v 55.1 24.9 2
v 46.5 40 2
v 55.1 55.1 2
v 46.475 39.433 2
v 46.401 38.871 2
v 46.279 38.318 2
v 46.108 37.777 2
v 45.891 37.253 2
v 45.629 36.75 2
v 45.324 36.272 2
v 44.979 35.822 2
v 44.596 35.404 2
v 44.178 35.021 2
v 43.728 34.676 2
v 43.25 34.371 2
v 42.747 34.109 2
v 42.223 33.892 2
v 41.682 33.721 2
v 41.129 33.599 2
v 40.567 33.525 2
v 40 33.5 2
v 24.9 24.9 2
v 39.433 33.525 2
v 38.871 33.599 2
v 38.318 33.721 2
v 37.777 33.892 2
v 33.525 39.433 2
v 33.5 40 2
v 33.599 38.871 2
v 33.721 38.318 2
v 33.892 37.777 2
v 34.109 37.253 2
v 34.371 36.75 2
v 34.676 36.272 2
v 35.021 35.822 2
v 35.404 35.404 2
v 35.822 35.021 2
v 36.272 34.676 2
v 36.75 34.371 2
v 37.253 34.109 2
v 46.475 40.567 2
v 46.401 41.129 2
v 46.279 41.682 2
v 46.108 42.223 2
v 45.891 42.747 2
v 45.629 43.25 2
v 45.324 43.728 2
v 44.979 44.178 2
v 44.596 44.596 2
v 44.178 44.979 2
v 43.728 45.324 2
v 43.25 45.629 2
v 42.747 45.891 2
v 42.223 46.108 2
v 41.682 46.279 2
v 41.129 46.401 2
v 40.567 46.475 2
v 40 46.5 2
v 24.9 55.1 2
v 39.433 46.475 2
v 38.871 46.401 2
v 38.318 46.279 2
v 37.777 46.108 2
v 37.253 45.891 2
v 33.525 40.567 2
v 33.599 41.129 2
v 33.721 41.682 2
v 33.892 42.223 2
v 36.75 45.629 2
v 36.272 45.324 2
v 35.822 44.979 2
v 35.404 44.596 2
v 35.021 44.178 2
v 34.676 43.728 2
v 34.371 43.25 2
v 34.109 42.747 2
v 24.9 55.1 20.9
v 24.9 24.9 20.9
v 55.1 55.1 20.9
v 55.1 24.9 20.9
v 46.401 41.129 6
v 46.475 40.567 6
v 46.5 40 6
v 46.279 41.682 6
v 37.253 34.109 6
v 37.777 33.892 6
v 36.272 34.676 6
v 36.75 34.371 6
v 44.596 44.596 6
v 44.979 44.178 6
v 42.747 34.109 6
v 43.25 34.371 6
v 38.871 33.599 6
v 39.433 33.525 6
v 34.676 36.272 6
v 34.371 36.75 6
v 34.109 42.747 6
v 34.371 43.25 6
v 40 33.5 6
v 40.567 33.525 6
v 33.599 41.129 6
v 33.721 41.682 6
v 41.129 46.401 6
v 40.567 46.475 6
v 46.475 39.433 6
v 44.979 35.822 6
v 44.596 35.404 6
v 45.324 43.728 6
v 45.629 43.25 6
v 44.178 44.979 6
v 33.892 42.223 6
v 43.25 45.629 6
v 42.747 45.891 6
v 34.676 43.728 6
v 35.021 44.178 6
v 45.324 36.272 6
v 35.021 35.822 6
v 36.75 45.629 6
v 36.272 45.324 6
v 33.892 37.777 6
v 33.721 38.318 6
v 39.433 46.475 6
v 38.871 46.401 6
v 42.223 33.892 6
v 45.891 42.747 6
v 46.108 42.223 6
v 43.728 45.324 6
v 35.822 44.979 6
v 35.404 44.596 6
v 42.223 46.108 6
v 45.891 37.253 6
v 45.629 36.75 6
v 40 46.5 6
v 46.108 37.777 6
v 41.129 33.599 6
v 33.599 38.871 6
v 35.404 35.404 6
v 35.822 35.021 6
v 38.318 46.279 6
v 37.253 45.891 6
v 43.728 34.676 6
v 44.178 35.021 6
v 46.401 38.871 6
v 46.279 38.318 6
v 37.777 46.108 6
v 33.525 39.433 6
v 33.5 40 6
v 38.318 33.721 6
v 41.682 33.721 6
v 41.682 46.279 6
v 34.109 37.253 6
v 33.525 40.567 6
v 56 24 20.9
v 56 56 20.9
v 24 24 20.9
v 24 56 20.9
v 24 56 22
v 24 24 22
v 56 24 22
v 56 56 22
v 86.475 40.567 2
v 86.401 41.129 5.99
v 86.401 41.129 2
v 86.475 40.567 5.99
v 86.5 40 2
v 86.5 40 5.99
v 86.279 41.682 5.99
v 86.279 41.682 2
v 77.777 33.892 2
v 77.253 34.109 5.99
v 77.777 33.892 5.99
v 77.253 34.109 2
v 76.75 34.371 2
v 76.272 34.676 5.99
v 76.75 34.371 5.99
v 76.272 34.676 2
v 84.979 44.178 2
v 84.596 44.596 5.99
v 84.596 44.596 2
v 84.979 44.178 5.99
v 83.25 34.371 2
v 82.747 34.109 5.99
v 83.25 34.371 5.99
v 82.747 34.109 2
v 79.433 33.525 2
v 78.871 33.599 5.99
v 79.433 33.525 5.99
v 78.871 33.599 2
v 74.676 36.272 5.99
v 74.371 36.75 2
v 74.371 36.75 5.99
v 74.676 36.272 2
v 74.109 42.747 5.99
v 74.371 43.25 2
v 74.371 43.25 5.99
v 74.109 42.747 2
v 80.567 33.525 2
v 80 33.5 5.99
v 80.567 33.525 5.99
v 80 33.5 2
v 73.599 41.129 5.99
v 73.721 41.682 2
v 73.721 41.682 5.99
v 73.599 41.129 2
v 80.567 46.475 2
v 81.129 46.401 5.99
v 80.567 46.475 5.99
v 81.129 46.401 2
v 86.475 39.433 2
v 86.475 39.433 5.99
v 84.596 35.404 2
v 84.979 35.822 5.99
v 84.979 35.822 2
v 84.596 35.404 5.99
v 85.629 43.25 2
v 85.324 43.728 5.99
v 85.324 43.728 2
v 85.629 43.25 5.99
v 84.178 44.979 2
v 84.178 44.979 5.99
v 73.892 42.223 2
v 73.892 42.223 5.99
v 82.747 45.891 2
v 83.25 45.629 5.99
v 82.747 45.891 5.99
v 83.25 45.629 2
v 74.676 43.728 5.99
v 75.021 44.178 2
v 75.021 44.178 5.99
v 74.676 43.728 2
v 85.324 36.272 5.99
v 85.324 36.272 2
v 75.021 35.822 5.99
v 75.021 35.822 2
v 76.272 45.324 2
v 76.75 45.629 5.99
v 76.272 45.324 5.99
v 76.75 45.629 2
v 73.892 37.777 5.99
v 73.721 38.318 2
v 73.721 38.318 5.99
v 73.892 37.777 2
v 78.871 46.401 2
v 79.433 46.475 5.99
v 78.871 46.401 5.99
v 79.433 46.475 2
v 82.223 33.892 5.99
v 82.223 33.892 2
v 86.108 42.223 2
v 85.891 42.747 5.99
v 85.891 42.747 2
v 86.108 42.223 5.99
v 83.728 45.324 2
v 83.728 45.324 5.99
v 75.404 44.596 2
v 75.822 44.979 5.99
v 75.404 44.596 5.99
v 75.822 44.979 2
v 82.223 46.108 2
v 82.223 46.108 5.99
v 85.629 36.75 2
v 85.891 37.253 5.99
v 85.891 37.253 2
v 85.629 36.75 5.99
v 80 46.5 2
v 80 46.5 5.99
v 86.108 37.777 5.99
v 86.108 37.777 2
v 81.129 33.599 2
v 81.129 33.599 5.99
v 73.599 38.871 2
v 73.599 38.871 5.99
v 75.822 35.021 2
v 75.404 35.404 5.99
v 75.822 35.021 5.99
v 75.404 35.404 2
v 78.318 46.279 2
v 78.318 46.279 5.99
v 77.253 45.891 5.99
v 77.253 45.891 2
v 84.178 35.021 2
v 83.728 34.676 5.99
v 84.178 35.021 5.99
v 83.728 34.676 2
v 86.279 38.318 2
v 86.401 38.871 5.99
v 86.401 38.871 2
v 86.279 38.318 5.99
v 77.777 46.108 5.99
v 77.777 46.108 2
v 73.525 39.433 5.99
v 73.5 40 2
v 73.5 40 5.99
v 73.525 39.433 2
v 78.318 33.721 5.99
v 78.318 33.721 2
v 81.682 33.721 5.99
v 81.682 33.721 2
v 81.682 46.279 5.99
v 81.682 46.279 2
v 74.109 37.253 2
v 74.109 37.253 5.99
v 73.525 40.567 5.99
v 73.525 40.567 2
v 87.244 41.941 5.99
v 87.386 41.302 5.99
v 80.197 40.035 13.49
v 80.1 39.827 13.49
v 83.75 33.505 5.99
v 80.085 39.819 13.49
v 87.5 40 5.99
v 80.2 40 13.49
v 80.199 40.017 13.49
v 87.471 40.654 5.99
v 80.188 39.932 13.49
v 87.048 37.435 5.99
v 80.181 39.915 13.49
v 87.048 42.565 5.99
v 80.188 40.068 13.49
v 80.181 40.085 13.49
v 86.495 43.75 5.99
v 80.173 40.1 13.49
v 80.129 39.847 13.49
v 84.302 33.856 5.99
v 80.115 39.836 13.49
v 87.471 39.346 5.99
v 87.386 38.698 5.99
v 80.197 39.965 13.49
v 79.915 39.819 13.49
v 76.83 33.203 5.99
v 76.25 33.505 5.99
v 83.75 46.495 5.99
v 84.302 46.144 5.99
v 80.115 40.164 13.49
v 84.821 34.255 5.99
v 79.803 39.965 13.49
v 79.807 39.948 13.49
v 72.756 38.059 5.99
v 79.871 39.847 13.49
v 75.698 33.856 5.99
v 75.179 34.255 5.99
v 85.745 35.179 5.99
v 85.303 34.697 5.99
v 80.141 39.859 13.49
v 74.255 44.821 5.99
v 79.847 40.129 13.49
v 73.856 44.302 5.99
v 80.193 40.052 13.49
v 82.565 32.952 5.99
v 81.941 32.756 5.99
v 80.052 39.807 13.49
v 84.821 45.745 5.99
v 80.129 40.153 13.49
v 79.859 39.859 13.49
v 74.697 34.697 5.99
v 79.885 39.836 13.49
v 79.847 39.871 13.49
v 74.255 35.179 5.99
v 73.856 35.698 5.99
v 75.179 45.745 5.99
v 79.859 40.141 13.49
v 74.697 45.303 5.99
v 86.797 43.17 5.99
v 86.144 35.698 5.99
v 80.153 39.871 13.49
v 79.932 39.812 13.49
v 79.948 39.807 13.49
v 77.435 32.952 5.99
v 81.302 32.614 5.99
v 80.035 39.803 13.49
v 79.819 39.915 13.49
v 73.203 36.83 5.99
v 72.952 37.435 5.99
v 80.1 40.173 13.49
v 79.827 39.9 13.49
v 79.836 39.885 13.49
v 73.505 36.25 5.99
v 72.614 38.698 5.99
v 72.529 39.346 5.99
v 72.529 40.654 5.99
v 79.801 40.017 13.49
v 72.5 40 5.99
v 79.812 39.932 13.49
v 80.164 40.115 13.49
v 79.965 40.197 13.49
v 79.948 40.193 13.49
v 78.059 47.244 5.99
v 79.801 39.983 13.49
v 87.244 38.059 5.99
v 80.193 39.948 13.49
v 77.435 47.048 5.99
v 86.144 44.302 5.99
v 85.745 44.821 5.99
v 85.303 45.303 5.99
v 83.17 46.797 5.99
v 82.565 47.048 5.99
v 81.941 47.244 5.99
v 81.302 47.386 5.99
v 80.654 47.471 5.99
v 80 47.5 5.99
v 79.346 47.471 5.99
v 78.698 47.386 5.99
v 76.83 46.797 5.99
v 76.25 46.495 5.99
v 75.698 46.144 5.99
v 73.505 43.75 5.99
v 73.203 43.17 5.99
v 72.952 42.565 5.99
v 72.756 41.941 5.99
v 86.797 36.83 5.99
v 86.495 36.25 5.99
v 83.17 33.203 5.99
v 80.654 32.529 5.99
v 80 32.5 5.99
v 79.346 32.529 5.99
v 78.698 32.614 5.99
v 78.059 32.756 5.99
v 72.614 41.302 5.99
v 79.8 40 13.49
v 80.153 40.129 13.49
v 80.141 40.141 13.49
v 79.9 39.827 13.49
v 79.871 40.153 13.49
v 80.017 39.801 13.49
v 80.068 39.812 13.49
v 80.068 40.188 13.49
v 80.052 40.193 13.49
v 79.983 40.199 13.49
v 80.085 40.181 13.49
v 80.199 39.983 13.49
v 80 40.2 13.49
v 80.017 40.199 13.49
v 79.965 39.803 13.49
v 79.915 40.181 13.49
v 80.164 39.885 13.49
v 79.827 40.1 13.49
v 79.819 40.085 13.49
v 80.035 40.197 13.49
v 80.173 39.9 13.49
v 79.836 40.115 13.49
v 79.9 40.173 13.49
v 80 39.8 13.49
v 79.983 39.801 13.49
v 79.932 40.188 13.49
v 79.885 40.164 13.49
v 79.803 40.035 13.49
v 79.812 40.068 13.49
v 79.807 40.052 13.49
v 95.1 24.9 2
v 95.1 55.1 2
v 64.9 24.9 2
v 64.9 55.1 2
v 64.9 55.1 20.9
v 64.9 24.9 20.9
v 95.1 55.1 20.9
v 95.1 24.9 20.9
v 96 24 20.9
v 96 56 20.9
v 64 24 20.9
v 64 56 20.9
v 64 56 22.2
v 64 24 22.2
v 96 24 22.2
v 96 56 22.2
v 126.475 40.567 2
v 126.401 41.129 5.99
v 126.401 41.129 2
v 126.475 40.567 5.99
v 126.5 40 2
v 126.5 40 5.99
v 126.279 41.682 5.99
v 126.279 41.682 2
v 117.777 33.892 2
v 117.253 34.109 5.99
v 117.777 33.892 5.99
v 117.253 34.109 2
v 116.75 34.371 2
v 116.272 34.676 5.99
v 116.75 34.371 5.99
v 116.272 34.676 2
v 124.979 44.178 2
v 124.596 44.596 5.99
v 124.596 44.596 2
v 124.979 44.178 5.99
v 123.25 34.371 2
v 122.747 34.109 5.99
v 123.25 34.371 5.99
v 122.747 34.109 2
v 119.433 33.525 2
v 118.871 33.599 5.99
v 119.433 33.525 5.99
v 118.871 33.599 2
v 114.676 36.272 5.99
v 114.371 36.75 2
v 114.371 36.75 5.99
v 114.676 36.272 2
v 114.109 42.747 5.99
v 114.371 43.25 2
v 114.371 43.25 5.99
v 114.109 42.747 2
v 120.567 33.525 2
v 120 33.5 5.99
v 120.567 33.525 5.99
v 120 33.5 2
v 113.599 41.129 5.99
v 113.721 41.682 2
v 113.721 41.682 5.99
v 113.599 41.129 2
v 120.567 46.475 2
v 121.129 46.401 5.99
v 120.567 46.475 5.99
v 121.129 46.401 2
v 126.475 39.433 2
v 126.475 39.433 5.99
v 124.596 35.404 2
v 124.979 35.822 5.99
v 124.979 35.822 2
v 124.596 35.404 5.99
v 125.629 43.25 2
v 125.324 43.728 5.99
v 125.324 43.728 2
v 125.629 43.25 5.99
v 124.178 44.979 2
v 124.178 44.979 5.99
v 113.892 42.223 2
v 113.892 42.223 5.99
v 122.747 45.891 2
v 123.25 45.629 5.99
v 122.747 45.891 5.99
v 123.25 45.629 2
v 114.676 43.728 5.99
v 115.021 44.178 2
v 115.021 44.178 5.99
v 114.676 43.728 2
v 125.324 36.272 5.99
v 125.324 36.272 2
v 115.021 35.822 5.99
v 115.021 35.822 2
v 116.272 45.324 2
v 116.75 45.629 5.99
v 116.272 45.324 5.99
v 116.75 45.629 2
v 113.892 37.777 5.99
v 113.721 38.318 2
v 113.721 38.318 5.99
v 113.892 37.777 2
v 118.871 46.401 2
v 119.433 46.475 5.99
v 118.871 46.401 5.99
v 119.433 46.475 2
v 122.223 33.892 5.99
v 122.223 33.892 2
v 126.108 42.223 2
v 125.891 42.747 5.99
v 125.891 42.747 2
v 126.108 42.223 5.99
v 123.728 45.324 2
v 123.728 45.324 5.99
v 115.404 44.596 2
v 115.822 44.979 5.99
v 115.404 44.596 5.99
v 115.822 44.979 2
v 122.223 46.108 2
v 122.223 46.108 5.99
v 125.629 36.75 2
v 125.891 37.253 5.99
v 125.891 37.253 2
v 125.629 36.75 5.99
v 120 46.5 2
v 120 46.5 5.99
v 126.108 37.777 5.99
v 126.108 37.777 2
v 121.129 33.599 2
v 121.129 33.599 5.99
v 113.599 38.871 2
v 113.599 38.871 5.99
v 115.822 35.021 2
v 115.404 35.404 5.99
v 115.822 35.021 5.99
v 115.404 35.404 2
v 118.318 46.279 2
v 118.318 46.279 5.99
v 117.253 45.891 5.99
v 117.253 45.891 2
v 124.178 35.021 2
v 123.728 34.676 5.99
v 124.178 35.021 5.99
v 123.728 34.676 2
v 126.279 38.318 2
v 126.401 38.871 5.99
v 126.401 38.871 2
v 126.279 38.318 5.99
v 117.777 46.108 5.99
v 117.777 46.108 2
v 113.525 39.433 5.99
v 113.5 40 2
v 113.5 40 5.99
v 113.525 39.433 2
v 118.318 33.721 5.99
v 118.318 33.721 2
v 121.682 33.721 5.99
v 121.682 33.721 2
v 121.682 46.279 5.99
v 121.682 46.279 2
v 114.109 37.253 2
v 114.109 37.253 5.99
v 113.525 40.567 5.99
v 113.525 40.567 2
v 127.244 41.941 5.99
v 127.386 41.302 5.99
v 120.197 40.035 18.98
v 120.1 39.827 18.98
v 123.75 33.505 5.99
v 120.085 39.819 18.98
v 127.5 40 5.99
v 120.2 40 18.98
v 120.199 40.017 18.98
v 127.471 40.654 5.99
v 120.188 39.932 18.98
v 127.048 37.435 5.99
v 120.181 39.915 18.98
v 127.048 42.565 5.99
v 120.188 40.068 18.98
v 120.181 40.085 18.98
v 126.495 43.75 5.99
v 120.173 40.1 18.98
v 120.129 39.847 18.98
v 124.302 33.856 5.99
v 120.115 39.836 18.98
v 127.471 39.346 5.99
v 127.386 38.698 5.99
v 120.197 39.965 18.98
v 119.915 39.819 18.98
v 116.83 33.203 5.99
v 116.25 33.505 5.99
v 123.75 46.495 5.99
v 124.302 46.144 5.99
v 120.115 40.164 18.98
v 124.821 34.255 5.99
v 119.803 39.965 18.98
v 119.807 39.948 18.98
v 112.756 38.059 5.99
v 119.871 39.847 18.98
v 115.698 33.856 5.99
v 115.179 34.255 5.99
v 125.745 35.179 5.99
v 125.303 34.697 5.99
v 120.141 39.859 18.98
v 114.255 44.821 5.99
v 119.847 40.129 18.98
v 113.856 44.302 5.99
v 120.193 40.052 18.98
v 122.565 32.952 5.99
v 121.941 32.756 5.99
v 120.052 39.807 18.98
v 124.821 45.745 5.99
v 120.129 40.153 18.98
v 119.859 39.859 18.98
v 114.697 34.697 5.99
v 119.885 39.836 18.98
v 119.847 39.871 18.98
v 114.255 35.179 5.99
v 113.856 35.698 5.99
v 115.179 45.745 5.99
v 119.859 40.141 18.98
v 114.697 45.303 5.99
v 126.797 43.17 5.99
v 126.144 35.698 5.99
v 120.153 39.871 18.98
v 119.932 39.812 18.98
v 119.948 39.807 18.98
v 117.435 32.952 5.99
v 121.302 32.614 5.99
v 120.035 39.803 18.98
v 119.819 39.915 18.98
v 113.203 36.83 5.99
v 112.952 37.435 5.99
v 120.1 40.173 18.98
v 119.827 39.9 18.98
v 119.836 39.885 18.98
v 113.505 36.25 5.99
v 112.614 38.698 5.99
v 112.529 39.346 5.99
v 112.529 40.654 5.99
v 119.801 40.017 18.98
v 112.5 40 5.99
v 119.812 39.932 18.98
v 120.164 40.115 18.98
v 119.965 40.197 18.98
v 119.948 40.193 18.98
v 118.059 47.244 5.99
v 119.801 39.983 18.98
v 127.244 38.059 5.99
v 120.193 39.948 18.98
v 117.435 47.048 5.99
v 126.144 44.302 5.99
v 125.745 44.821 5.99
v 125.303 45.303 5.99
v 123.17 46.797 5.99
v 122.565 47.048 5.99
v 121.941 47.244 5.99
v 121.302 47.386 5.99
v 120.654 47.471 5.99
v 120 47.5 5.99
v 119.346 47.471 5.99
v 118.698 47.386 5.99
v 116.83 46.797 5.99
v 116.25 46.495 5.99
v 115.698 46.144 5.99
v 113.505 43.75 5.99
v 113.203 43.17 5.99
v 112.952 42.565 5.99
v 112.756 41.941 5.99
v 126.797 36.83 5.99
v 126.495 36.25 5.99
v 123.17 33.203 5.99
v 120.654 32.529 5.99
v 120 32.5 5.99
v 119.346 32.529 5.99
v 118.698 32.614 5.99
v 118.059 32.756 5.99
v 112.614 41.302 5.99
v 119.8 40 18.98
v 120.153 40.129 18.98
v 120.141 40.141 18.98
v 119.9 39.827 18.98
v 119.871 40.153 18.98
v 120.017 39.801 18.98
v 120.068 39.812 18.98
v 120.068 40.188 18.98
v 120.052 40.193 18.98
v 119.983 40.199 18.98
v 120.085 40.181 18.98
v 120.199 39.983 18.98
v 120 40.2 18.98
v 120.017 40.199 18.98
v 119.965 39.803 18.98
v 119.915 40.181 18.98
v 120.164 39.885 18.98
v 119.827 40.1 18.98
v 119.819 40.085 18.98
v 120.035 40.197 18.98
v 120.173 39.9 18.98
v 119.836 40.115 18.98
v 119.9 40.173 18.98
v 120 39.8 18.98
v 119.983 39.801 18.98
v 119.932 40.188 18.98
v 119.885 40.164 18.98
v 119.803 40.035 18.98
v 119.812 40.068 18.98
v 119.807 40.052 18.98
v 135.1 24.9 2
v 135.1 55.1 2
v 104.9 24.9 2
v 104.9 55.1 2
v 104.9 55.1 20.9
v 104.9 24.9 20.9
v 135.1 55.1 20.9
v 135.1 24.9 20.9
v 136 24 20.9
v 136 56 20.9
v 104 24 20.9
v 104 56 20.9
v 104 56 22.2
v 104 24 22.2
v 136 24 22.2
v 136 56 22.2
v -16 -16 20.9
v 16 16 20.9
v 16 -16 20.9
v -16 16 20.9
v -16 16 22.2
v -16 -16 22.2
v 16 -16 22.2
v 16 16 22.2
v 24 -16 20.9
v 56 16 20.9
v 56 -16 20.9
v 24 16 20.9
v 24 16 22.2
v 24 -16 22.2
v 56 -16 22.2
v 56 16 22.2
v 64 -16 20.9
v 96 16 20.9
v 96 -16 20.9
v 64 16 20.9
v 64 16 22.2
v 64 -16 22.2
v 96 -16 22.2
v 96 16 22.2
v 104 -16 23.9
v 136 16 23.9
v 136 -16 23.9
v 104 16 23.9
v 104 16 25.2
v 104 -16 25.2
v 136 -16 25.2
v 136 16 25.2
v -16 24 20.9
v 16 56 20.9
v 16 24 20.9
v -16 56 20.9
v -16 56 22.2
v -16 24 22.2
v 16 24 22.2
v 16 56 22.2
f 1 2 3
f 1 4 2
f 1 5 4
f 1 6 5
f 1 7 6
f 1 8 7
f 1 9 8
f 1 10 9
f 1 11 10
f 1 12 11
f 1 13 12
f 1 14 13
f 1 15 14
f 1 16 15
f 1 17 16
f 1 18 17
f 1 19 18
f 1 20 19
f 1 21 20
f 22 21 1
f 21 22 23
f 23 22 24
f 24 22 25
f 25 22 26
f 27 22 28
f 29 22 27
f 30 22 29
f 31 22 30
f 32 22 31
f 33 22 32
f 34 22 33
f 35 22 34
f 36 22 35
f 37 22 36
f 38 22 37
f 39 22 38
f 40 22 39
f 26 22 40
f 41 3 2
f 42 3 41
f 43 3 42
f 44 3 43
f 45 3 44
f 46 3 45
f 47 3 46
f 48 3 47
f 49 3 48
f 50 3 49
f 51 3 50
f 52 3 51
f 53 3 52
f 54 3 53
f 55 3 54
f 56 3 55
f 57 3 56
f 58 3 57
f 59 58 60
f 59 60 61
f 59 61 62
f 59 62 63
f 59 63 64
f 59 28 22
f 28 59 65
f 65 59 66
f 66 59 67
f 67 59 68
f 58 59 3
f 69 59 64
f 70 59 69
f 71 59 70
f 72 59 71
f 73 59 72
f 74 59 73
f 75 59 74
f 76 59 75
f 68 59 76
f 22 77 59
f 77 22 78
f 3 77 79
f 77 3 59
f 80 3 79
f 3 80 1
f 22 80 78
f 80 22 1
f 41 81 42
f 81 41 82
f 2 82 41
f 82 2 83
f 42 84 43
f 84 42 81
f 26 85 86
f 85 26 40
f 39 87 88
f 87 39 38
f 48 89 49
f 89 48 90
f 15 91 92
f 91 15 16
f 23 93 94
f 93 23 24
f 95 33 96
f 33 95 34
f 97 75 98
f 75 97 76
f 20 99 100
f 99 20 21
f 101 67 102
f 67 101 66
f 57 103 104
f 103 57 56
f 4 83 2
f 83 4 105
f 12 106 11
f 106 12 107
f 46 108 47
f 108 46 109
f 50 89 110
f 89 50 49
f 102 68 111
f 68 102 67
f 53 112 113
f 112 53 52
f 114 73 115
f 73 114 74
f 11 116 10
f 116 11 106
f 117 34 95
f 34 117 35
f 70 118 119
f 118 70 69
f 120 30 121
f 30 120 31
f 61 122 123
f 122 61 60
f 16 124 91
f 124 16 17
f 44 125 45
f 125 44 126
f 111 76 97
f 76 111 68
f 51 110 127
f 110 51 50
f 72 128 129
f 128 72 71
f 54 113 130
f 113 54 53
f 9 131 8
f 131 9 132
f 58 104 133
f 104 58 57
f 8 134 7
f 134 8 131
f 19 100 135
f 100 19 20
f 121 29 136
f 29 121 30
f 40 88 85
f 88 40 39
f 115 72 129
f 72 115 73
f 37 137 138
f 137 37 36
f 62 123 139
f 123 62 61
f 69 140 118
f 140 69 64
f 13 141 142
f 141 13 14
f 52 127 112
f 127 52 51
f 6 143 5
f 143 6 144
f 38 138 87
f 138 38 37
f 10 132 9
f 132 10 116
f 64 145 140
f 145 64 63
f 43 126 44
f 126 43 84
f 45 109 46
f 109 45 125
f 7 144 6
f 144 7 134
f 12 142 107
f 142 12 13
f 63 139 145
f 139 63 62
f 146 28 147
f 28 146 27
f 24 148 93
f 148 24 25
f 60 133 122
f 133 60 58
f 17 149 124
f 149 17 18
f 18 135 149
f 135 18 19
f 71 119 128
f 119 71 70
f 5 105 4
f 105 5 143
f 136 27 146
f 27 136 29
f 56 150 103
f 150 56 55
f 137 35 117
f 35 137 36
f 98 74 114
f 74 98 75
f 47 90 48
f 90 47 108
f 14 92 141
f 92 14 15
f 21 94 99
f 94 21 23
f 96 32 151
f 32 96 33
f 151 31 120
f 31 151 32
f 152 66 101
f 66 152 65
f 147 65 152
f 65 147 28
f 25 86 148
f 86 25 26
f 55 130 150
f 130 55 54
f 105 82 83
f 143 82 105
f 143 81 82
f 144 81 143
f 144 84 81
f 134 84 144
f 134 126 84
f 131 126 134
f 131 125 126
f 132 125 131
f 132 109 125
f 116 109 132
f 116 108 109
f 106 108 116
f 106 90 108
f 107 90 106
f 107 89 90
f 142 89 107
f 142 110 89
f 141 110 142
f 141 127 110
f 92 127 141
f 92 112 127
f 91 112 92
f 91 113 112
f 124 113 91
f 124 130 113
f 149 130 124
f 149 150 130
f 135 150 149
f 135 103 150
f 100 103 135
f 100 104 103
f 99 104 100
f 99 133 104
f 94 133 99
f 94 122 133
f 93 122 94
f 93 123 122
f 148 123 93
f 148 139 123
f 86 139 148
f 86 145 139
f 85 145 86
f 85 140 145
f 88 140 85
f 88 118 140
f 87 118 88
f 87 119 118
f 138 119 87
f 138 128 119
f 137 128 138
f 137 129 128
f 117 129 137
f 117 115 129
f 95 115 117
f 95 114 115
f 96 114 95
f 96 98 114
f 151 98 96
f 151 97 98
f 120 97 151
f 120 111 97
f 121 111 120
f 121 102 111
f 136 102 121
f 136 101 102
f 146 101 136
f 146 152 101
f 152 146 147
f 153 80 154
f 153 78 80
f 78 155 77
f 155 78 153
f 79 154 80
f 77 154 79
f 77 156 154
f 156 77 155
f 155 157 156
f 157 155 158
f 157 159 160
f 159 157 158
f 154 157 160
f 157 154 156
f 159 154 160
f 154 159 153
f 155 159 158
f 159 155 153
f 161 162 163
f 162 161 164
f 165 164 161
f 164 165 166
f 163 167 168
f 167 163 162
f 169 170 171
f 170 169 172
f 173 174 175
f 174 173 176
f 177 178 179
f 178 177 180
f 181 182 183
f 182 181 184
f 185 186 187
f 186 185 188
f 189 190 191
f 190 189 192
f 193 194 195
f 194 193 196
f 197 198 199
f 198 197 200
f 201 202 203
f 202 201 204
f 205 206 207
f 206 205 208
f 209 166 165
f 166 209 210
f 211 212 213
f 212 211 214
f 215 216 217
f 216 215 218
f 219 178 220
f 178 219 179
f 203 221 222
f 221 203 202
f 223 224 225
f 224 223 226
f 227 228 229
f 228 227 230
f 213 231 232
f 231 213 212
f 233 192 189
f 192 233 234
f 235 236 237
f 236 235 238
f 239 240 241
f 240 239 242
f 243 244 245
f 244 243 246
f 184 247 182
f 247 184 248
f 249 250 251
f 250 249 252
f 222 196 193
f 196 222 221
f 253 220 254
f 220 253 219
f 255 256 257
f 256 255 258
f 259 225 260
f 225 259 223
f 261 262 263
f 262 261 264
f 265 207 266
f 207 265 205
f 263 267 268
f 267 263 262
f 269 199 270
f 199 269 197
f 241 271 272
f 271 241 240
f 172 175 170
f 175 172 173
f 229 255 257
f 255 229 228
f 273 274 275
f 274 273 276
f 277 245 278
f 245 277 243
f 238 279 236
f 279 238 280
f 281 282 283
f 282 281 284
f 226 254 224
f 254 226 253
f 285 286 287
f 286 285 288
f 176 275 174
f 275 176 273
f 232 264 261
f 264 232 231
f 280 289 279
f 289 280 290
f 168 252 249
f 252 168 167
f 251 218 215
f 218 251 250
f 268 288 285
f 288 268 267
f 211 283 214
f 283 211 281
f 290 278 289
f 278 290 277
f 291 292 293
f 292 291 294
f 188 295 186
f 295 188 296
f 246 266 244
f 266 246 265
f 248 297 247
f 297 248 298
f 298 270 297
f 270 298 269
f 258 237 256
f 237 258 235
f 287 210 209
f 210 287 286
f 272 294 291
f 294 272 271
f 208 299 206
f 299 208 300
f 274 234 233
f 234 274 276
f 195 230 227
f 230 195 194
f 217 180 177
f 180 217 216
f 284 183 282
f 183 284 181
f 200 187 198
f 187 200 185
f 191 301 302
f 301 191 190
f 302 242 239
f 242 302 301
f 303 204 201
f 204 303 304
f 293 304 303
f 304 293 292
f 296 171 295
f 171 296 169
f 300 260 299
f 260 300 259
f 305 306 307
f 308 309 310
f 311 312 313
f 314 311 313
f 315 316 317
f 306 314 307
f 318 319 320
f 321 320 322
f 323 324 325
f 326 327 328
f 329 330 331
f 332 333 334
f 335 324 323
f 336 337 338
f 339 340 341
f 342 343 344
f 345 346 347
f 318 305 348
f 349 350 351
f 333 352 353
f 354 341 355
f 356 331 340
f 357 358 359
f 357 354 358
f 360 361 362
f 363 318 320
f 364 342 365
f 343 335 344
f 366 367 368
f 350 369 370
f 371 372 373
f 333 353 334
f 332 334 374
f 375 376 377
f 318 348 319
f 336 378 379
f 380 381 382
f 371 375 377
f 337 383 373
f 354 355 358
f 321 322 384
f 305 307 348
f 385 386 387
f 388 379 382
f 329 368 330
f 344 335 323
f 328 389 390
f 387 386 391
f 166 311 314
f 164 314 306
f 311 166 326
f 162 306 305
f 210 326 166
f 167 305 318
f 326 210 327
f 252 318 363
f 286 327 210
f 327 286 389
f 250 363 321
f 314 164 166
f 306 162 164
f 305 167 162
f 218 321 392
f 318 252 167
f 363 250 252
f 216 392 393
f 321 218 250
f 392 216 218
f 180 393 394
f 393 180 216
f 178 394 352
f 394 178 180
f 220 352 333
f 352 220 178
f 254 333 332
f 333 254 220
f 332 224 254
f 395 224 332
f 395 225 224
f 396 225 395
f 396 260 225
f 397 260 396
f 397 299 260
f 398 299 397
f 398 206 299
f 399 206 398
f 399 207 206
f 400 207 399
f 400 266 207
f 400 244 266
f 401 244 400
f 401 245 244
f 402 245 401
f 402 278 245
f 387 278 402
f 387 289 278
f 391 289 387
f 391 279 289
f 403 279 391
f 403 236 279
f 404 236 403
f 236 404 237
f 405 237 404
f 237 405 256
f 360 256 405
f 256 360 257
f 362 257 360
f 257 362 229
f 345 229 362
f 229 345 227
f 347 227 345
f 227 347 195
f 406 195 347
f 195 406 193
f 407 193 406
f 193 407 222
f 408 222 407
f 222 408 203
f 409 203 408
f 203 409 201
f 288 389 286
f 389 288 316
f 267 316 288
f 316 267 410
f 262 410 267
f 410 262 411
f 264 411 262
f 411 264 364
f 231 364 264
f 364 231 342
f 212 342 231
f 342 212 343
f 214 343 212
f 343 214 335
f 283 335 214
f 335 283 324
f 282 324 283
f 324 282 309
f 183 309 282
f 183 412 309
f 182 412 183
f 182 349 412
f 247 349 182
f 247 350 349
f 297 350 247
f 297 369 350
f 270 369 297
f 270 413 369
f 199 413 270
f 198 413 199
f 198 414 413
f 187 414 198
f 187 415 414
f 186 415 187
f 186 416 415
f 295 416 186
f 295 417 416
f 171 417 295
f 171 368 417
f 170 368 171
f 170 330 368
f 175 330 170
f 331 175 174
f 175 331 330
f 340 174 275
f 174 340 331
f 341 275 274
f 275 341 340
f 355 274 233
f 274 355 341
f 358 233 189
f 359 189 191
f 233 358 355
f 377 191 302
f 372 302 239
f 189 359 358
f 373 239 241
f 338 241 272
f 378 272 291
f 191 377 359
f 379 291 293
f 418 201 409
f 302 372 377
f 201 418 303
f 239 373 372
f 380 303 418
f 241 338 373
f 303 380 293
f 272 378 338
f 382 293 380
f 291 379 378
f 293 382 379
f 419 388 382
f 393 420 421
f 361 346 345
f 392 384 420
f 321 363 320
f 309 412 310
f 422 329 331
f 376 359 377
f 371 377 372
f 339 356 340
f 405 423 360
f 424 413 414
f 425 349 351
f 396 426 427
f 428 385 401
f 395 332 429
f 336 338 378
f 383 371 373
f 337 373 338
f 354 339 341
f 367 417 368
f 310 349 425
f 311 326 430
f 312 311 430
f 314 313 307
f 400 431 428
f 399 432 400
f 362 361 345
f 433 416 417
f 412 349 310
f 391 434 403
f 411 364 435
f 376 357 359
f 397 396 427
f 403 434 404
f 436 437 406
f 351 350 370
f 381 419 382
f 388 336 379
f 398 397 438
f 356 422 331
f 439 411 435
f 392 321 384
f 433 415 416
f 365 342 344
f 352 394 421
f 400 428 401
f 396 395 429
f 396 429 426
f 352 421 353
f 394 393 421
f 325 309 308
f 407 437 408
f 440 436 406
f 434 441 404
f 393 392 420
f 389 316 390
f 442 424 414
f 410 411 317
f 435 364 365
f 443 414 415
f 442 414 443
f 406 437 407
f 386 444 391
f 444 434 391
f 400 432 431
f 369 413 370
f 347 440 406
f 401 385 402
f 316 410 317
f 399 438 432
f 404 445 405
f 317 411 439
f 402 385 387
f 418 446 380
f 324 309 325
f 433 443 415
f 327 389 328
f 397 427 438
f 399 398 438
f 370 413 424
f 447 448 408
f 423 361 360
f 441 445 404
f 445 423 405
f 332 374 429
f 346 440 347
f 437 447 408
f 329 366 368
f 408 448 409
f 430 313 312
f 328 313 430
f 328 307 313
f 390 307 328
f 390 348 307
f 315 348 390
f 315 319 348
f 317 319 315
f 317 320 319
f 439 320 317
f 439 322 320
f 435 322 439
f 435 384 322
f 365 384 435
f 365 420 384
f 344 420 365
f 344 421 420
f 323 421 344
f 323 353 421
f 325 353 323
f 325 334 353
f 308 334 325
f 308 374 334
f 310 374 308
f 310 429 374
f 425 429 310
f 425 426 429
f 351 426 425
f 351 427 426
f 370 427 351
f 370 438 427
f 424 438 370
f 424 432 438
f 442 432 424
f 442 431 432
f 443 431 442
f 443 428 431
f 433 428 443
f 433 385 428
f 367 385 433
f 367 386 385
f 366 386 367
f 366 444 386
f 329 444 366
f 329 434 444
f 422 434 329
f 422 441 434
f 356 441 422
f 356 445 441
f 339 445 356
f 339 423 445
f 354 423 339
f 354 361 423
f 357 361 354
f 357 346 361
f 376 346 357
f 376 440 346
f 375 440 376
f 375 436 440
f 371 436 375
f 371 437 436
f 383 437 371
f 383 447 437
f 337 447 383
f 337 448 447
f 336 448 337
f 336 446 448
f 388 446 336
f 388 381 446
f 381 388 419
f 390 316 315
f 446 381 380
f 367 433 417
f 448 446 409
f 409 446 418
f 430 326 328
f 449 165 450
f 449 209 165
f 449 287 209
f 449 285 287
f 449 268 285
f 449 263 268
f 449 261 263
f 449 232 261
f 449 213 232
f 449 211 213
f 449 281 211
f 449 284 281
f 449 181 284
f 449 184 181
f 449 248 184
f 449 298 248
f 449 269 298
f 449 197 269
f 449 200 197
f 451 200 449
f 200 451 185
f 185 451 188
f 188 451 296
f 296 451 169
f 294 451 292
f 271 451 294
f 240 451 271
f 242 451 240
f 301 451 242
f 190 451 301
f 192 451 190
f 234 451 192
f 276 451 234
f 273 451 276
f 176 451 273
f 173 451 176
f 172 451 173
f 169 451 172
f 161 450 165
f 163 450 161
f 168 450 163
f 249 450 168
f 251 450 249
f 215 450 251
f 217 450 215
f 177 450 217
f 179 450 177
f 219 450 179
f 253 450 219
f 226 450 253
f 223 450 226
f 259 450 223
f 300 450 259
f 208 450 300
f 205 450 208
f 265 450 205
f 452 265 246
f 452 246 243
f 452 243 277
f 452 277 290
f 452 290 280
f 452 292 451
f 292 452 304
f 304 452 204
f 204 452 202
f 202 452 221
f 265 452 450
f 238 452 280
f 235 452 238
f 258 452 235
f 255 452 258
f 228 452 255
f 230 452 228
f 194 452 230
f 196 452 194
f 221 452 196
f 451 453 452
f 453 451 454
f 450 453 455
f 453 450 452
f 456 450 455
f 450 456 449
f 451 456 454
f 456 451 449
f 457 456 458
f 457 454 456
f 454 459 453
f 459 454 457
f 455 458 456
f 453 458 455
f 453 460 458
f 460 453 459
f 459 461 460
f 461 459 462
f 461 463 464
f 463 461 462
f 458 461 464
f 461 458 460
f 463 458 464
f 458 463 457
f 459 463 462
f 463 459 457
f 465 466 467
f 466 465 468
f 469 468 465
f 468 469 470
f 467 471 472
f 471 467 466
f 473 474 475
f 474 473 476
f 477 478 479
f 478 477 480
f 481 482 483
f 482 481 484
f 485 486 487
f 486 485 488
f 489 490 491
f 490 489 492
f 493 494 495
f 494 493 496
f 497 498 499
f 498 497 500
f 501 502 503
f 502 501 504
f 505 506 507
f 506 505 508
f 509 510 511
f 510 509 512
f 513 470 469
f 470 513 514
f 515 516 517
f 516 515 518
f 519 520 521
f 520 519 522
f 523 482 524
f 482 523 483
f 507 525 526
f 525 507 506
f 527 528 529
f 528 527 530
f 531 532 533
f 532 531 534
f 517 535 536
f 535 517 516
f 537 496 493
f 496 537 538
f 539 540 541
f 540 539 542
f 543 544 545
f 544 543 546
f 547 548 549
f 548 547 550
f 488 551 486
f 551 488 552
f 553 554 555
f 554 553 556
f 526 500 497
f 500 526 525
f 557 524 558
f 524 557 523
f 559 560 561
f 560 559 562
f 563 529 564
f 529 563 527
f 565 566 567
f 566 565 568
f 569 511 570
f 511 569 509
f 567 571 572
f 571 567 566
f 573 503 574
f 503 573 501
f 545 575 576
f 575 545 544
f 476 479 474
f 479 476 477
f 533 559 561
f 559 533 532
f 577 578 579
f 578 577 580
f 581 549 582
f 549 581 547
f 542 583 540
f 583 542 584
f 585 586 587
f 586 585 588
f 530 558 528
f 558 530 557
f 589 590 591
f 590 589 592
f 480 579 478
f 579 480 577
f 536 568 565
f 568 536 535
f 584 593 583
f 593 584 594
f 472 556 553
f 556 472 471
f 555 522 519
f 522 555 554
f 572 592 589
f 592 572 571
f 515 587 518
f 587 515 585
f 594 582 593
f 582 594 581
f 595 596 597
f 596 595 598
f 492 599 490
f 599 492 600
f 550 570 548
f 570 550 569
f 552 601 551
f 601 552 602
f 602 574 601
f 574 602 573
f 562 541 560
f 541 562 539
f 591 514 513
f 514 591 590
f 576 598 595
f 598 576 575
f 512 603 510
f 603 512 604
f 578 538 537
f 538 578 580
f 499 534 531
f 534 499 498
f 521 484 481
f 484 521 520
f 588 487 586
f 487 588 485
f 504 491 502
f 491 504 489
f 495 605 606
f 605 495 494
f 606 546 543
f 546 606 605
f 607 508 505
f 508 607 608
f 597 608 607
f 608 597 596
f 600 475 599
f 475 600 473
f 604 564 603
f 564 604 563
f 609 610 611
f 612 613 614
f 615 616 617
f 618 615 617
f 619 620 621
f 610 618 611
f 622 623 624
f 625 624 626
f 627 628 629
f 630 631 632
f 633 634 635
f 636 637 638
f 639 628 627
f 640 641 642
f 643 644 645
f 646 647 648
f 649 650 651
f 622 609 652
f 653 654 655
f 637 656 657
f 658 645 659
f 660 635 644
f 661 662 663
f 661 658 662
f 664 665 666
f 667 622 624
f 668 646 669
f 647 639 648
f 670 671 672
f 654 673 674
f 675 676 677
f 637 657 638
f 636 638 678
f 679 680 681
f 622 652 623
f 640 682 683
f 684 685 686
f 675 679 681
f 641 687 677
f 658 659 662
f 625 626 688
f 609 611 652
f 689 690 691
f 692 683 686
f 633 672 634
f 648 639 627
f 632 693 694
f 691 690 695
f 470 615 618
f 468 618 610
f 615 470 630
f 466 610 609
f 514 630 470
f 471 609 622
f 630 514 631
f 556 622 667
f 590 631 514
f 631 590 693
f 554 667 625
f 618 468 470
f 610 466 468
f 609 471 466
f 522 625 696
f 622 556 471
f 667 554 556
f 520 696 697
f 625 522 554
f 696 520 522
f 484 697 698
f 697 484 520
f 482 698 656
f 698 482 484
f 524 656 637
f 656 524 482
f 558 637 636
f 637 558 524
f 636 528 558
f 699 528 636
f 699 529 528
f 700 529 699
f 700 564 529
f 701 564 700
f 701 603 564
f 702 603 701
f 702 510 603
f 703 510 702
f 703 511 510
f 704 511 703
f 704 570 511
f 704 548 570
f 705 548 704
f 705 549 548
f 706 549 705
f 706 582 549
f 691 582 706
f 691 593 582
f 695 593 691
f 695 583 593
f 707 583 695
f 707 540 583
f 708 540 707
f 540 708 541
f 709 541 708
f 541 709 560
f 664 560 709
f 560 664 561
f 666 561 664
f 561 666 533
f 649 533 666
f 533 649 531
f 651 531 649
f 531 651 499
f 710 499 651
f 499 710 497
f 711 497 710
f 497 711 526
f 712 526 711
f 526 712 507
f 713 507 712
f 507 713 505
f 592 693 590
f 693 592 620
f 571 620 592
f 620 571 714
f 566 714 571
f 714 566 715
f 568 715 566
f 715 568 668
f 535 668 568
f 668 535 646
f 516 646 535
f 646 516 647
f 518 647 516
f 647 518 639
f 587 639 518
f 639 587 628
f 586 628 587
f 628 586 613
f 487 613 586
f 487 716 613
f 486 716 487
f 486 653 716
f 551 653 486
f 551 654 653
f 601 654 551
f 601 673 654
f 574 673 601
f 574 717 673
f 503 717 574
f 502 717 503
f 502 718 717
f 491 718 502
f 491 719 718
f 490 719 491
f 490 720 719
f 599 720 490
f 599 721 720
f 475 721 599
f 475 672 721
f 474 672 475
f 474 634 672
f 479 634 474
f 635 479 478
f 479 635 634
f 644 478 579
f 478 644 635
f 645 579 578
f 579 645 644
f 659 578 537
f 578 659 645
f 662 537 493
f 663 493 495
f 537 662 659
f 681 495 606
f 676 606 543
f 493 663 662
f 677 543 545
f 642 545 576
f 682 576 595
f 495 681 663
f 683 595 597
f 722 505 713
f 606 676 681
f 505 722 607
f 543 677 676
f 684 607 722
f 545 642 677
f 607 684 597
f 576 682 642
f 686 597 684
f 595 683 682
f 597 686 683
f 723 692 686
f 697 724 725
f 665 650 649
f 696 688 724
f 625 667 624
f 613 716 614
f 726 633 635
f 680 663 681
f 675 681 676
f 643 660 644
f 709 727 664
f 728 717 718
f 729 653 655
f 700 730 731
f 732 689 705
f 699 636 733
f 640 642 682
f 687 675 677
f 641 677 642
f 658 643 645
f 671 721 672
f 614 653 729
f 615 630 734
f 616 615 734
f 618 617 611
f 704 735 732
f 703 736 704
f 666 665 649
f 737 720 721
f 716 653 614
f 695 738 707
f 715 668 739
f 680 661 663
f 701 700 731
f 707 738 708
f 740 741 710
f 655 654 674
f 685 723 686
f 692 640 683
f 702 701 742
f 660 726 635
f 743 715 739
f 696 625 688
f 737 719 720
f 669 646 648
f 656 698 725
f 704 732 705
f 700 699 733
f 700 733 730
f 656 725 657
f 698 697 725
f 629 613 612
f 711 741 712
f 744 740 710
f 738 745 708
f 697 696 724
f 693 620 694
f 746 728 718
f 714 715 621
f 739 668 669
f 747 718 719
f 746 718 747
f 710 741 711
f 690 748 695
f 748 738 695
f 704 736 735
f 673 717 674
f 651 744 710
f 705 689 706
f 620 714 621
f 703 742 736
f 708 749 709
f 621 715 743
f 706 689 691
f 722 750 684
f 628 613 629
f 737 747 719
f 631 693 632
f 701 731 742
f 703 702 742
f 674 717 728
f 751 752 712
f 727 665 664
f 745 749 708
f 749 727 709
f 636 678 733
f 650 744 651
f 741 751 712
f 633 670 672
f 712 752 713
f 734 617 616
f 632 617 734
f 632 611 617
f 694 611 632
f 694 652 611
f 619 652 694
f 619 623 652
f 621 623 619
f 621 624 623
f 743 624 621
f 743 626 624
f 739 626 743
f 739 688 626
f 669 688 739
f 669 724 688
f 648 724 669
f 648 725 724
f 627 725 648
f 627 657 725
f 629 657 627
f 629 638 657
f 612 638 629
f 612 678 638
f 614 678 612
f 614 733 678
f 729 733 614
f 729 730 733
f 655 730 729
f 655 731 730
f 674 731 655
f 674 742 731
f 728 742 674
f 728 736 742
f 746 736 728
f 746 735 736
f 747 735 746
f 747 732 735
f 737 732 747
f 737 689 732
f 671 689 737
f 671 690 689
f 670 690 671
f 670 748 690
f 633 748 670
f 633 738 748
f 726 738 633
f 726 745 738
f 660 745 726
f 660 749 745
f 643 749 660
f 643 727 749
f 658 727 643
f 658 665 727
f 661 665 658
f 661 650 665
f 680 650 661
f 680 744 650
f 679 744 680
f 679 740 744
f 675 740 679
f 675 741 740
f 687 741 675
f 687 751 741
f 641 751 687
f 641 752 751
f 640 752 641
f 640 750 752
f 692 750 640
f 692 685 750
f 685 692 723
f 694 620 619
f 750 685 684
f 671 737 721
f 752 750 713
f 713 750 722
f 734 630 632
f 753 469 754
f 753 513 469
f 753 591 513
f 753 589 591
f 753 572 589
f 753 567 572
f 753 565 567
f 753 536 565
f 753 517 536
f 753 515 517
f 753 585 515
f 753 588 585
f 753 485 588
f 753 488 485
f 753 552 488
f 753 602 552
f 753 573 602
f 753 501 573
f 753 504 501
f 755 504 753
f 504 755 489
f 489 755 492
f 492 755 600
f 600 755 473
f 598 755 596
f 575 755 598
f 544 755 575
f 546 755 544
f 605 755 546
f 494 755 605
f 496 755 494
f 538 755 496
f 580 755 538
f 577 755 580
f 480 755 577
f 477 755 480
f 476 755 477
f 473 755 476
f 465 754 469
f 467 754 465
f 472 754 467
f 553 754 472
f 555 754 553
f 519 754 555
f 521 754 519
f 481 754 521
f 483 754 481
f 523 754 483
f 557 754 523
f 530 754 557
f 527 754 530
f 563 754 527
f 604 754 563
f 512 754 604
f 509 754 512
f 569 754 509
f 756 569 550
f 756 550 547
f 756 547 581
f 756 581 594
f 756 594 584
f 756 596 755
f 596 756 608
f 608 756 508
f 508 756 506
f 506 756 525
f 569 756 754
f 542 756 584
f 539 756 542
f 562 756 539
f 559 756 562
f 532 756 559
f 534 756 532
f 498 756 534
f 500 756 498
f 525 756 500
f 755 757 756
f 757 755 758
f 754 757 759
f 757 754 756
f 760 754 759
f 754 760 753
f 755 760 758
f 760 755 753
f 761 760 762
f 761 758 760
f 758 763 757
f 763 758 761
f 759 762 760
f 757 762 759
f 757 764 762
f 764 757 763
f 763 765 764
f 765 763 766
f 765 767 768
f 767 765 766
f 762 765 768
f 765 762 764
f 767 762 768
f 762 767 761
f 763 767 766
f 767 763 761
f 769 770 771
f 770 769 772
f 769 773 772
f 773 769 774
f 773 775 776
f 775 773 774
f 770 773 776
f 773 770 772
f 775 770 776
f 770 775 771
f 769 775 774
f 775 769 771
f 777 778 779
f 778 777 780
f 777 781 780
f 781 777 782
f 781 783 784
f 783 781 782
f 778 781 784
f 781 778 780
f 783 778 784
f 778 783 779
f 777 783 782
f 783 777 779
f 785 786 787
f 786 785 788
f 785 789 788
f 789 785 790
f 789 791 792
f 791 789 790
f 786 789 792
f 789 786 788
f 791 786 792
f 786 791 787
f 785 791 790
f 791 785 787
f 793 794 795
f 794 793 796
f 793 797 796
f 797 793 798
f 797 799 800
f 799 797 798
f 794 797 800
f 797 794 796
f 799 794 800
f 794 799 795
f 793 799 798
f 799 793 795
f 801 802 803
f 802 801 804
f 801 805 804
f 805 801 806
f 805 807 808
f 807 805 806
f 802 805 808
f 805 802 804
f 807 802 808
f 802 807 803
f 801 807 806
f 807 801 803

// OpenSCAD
// file: ../lens_cell.scad
// ===== Integrated lit-cell test matrix =====
// Single-print, dual-material (white body + clear optic) diffuser cells to find
// the best "even, sourceless glow" recipe -- the optical coupon for the eventual
// TEDxFargo letter strokes. The winning cross-section (depth/mask/material split)
// transfers to the letterforms later.
//
// PRINT PLATE-DOWN (collar on the bed, optic on top): no flip, no chirality
// issue; the pixel inserts from the back after printing. Co-printed two-material:
//   WHITE  = body (plate + walls + masks/reflectors)   -> filament/nozzle 1
//   CLEAR  = optic (face / fill / puck)                 -> filament/nozzle 2
// Export two co-registered STLs (same origin): matrix_white + matrix_clear, load
// both in Bambu Studio, assign materials, print as one job.
//
// Families (research-tuned, see 2026-06-29 spec for sources):
//   A  masked reflector cavity  (white walls + PERFORATED hotspot dot + clear face)
//   R  reflector cone           (white volcano around LED + clear face)
//   B  volumetric scatter       (clear fill; slice this cell with ~15% GYROID infill)
//   C  TIR puck                 (solid clear + center cone refractor)

include <config.scad>
include <collar.scad>

// ---- cell shell geometry ----
lc_inner = cell_inner;            // 30mm interior square (reuse config)
lc_wall  = 2.0;                   // white wall thickness
lc_outer = lc_inner + 2*lc_wall;  // 34mm outer
lc_pitch = lc_outer + 6;          // 40mm grid spacing (6mm gap between cells)
lc_fuse  = 0.1;                   // white/clear overlap so the slicer fuses them
led_void = 13.0;                  // keep-out diameter for the LED dome (>12mm)

// wall height above the plate for a chosen LED-tip -> face gap
function lc_wall_h(gap) = dome_clear + gap;

// ===== test matrix =====  [code, type, gap, p1, p2]
//   A: p1 = mask diameter (0 = none), p2 = mask standoff (mm above the dome tip)
//   R / B: no extra params
//   C: p1 = cone included-angle (deg)
lc_cells = [
    ["A0", "A", 15,  0,  0],   // 1: baseline, no mask (expect a center hotspot)
    ["A1", "A", 15, 14,  5],   // 2: perforated dot d14, 5mm above dome
    ["A2", "A", 15, 16,  5],   // 3: perforated dot d16 (more "white around bulb")
    ["A3", "A", 18, 14,  6],   // 4: deeper cavity + dot
    ["R1", "R", 15,  0,  0],   // 5: reflector cone (volcano), no mask
    ["B1", "B", 15,  0,  0],   // 6: clear fill  -> slice with 15% gyroid infill
    ["C1", "C", 15, 90,  0],   // 7: TIR puck, 90deg cone
    ["C2", "C", 15, 60,  0],   // 8: TIR puck, 60deg cone (steeper, more sideways)
];
lc_cols = 4;

function lc_pos(idx) = [ (idx % lc_cols) * lc_pitch, floor(idx / lc_cols) * lc_pitch ];

// ---------------- WHITE body ----------------
module lc_walls(gap) {
    translate([0,0,plate_t])
        linear_extrude(lc_wall_h(gap))
            difference() { square(lc_outer, center=true); square(lc_inner, center=true); }
}

// approach-A: a PERFORATED white dot on 3 legs, floated close to the LED. The
// perforations make it semi-transparent (soft penumbra, no hard dark disc) while
// the white struts reflect/recycle the central peak. Self-supporting: legs are
// vertical, and the perforated disc bridges only ~1.7mm hole-to-hole.
module lc_mask(gap, mask_d, stand_mm) {
    if (mask_d > 0) {
        mt = 1.5;                                      // disc thickness
        zb = plate_t + dome_clear + stand_mm;          // disc bottom height
        rl = max(mask_d/2 - 0.8, 7.0);                 // leg radius (>=7 clears the dome)
        difference() {
            translate([0,0,zb]) cylinder(h=mt, d=mask_d);
            for (x=[-mask_d/2:2.6:mask_d/2], y=[-mask_d/2:2.6:mask_d/2])  // ~43% open
                translate([x,y,zb-0.1]) cylinder(h=mt+0.2, d=1.7, $fn=12);
        }
        for (a=[0:120:359])
            rotate(a) translate([rl,0,plate_t]) cylinder(h=zb-plate_t+0.01, d=1.8);
    }
}

// approach-R: a white "volcano" around the LED, open top, walls narrowing upward
// (self-supporting), throwing side light out to the cavity walls.
module lc_reflector(gap) {
    h = min(lc_wall_h(gap)-1, dome_clear + gap*0.6);
    translate([0,0,plate_t])
        difference() {
            cylinder(h=h, d1=led_void+6, d2=led_void+1);
            translate([0,0,-0.1]) cylinder(h=h+0.2, d1=led_void+2.5, d2=led_void-2.5);
        }
}

module lc_body_optic(spec) {
    type = spec[1]; gap = spec[2];
    if (type == "A") lc_mask(gap, spec[3], spec[4]);
    if (type == "R") lc_reflector(gap);
}

// ---------------- CLEAR optic ----------------
module lc_face(gap, face_t) {     // clear top, overlapping wall tops for a fused seam
    translate([0,0,plate_t+lc_wall_h(gap)-lc_fuse])
        linear_extrude(face_t+lc_fuse) square(lc_inner+lc_wall, center=true);
}

module lc_fill(gap) {             // B: solid clear fill (slice with ~15% gyroid infill)
    wh = lc_wall_h(gap);
    difference() {
        translate([0,0,plate_t]) linear_extrude(wh) square(lc_inner+2*lc_fuse, center=true);
        translate([0,0,plate_t-0.1]) cylinder(h=dome_clear+0.1, d=led_void);
    }
    lc_face(gap, 1.0);
}

module lc_puck(gap, cone_ang) {   // C: solid clear + center cone refractor (TIR)
    wh = lc_wall_h(gap);
    cone_r = led_void/2 + 1;
    cone_h = cone_r / tan(cone_ang/2);
    difference() {
        translate([0,0,plate_t]) linear_extrude(wh) square(lc_inner+2*lc_fuse, center=true);
        union() {
            translate([0,0,plate_t-0.1]) cylinder(h=dome_clear+0.1, d=led_void);
            translate([0,0,plate_t+dome_clear-0.01]) cylinder(h=cone_h, r1=cone_r, r2=0.2);
        }
    }
    lc_face(gap, 1.2);
}

module lc_clear_optic(spec) {
    type = spec[1]; gap = spec[2];
    if (type == "A" || type == "R") lc_face(gap, 1.2);
    if (type == "B") lc_fill(gap);
    if (type == "C") lc_puck(gap, spec[3]);
}

// ---------------- matrix assembly ----------------
module lc_label(idx) {            // (idx+1) debossed dots on the plate bottom, front-left
    n = idx + 1;
    for (k=[0:n-1])
        translate([-lc_outer/2+5+k*3, -lc_outer/2+4, -0.1]) cylinder(h=0.9, d=1.8, $fn=16);
}

module matrix_white() {
    rows = ceil(len(lc_cells)/lc_cols);
    difference() {
        union() {
            // one base slab tying all cells into a handleable tray
            translate([-lc_outer/2, -lc_outer/2, 0])
                linear_extrude(plate_t)
                    square([(lc_cols-1)*lc_pitch + lc_outer, (rows-1)*lc_pitch + lc_outer]);
            for (idx=[0:len(lc_cells)-1]) {
                p = lc_pos(idx);
                translate([p[0],p[1],0]) { lc_walls(lc_cells[idx][2]); lc_body_optic(lc_cells[idx]); }
            }
        }
        for (idx=[0:len(lc_cells)-1]) {
            p = lc_pos(idx);
            translate([p[0],p[1],0]) {
                translate([0,0,-0.1]) cylinder(h=plate_t+0.2, d=pixel_through);
                lc_label(idx);
            }
        }
    }
    for (idx=[0:len(lc_cells)-1]) { p = lc_pos(idx); place_collar(p[0], p[1]); }
}

module matrix_clear() {
    for (idx=[0:len(lc_cells)-1]) {
        p = lc_pos(idx);
        translate([p[0],p[1],0]) lc_clear_optic(lc_cells[idx]);
    }
}
// file: ../collar.scad
// Calibrated press-fit collar, merged into the rear wall at each pixel.
// The STL is symmetric top/bottom (retention lip at mid-height), so insertion
// direction does not matter. Native STL sits X-centered at collar_cx, Z 0..collar_h.

module collar_solid() {
    translate([-collar_cx, 0, 0])
        import(collar_stl, convexity = 6);
}

module place_collar(x, y) {
    translate([x, y, 0]) collar_solid();
}
// file: ../config.scad
// ===== CHARGE LED sign — global config =====
// Edit this file; then run ./build.sh to regenerate every STL.

$fn = 72;

// ---- calibrated collar (press-fit for 12mm bullet pixel) ----
collar_stl    = "../../assets/bullet-collar.stl"; // path resolved from src/parts/ entry files
collar_h      = 2.0;     // Z span of the collar STL
collar_od     = 16.0;    // collar outer diameter
collar_cx     = 43.0;    // STL native X center (Y center is 0)
pixel_through = 12.3;    // clearance hole through the plate (just over bore Ø12.19)
dome_clear    = 4.0;     // dome protrusion above plate front. Spec: 5.5mm dome-tip-to-flange,
                         // flange seats on plate back, minus 2mm plate ~= 3.5-4mm. Seat a real
                         // pixel and measure to lock it in.

// ---- shell ----
plate_t    = 2.0;        // rear plate thickness (== collar_h, so the collar sits flush)
wall_t     = 2.5;        // chimney wall thickness
cell_inner = 30;         // square interior of each test cell (the press-fit opening)

// ---- diffuser panels (flat, drop-in — kept for the final glued option) ----
panel_press_clear = 0.25; // panel is this much SMALLER than the opening (total) -> friction fit
panel_thicks      = [1, 2, 3];

// ---- diffuser CAP (slides over an ISOLATED chimney; not used on touching rows) ----
cap_fit_clear = 0.4;   // skirt-inner minus chimney-outer (total); bigger = looser slide
cap_skirt_t   = 1.6;   // skirt wall thickness
cap_skirt_h   = 7;     // how far the skirt grips down over the chimney

// ---- diffuser LID = flanged plug (plug locates in the opening, flange catches on the rim) ----
lid_flange_cover = wall_t;  // flange overhang per side ~= wall width (rests on rim, can't fall in)
lid_flange_gap   = 0.3;     // shrink the flange a hair so neighbour lids don't clash
lid_plug_h       = 4;       // how far the plug drops into the opening (0 = plain flat tile)
lid_plug_clear   = 0.2;     // plug-outer = opening minus this (total) -> friction fit
                            // (was 0.5/loose; PETG plug in a PLA hole grips well at 0.2)
lid_plug_wall    = 1.5;     // plug-frame wall thickness

// ---- coupon depth ladder ----
led_gaps = [10, 15, 20]; // clear LED-tip -> diffuser distance, per cell (mm)
                         // (was [20,35,50] — 35/50 went too dim/washed; 20 is the new max)

// ---- collar v2: original bore + lip, plus a 45-deg lead-in chamfer ----
bore_face_r   = 6.10;    // collar bore radius at each face (~Ø12.2)
chamfer_depth = 0.5;     // axial depth of the 45-deg lead-in at each face
mouth_r       = bore_face_r + chamfer_depth;  // chamfer mouth radius (~Ø13.2)

// ---- collar A/B test harness ----
harness_w     = 52;      // tile width
harness_d     = 30;      // tile depth
harness_t     = plate_t; // match the real wall thickness for a faithful fit test
harness_pitch = 24;      // spacing between the two hole centers

// ---- derived ----
cell_pitch = cell_inner + 2 * wall_t;      // outer cell footprint (35)
n_cells    = len(led_gaps);
plate_w    = n_cells * cell_pitch;
plate_d    = cell_pitch;
panel_side = cell_inner - panel_press_clear;
function cell_x(i)     = i * cell_pitch + cell_pitch / 2;   // column center (distance)
function cell_y(j)     = j * cell_pitch + cell_pitch / 2;   // row center (for grid coupons)
function chimney_H(i)  = plate_t + dome_clear + led_gaps[i];
// main file
// CLEAR optic of the lit-cell test matrix -> nozzle/filament 2 (clear PETG).
// Co-registered with matrix_white (same origin). Print plate-down.
include <../config.scad>
include <../collar.scad>
include <../lens_cell.scad>
matrix_clear();
